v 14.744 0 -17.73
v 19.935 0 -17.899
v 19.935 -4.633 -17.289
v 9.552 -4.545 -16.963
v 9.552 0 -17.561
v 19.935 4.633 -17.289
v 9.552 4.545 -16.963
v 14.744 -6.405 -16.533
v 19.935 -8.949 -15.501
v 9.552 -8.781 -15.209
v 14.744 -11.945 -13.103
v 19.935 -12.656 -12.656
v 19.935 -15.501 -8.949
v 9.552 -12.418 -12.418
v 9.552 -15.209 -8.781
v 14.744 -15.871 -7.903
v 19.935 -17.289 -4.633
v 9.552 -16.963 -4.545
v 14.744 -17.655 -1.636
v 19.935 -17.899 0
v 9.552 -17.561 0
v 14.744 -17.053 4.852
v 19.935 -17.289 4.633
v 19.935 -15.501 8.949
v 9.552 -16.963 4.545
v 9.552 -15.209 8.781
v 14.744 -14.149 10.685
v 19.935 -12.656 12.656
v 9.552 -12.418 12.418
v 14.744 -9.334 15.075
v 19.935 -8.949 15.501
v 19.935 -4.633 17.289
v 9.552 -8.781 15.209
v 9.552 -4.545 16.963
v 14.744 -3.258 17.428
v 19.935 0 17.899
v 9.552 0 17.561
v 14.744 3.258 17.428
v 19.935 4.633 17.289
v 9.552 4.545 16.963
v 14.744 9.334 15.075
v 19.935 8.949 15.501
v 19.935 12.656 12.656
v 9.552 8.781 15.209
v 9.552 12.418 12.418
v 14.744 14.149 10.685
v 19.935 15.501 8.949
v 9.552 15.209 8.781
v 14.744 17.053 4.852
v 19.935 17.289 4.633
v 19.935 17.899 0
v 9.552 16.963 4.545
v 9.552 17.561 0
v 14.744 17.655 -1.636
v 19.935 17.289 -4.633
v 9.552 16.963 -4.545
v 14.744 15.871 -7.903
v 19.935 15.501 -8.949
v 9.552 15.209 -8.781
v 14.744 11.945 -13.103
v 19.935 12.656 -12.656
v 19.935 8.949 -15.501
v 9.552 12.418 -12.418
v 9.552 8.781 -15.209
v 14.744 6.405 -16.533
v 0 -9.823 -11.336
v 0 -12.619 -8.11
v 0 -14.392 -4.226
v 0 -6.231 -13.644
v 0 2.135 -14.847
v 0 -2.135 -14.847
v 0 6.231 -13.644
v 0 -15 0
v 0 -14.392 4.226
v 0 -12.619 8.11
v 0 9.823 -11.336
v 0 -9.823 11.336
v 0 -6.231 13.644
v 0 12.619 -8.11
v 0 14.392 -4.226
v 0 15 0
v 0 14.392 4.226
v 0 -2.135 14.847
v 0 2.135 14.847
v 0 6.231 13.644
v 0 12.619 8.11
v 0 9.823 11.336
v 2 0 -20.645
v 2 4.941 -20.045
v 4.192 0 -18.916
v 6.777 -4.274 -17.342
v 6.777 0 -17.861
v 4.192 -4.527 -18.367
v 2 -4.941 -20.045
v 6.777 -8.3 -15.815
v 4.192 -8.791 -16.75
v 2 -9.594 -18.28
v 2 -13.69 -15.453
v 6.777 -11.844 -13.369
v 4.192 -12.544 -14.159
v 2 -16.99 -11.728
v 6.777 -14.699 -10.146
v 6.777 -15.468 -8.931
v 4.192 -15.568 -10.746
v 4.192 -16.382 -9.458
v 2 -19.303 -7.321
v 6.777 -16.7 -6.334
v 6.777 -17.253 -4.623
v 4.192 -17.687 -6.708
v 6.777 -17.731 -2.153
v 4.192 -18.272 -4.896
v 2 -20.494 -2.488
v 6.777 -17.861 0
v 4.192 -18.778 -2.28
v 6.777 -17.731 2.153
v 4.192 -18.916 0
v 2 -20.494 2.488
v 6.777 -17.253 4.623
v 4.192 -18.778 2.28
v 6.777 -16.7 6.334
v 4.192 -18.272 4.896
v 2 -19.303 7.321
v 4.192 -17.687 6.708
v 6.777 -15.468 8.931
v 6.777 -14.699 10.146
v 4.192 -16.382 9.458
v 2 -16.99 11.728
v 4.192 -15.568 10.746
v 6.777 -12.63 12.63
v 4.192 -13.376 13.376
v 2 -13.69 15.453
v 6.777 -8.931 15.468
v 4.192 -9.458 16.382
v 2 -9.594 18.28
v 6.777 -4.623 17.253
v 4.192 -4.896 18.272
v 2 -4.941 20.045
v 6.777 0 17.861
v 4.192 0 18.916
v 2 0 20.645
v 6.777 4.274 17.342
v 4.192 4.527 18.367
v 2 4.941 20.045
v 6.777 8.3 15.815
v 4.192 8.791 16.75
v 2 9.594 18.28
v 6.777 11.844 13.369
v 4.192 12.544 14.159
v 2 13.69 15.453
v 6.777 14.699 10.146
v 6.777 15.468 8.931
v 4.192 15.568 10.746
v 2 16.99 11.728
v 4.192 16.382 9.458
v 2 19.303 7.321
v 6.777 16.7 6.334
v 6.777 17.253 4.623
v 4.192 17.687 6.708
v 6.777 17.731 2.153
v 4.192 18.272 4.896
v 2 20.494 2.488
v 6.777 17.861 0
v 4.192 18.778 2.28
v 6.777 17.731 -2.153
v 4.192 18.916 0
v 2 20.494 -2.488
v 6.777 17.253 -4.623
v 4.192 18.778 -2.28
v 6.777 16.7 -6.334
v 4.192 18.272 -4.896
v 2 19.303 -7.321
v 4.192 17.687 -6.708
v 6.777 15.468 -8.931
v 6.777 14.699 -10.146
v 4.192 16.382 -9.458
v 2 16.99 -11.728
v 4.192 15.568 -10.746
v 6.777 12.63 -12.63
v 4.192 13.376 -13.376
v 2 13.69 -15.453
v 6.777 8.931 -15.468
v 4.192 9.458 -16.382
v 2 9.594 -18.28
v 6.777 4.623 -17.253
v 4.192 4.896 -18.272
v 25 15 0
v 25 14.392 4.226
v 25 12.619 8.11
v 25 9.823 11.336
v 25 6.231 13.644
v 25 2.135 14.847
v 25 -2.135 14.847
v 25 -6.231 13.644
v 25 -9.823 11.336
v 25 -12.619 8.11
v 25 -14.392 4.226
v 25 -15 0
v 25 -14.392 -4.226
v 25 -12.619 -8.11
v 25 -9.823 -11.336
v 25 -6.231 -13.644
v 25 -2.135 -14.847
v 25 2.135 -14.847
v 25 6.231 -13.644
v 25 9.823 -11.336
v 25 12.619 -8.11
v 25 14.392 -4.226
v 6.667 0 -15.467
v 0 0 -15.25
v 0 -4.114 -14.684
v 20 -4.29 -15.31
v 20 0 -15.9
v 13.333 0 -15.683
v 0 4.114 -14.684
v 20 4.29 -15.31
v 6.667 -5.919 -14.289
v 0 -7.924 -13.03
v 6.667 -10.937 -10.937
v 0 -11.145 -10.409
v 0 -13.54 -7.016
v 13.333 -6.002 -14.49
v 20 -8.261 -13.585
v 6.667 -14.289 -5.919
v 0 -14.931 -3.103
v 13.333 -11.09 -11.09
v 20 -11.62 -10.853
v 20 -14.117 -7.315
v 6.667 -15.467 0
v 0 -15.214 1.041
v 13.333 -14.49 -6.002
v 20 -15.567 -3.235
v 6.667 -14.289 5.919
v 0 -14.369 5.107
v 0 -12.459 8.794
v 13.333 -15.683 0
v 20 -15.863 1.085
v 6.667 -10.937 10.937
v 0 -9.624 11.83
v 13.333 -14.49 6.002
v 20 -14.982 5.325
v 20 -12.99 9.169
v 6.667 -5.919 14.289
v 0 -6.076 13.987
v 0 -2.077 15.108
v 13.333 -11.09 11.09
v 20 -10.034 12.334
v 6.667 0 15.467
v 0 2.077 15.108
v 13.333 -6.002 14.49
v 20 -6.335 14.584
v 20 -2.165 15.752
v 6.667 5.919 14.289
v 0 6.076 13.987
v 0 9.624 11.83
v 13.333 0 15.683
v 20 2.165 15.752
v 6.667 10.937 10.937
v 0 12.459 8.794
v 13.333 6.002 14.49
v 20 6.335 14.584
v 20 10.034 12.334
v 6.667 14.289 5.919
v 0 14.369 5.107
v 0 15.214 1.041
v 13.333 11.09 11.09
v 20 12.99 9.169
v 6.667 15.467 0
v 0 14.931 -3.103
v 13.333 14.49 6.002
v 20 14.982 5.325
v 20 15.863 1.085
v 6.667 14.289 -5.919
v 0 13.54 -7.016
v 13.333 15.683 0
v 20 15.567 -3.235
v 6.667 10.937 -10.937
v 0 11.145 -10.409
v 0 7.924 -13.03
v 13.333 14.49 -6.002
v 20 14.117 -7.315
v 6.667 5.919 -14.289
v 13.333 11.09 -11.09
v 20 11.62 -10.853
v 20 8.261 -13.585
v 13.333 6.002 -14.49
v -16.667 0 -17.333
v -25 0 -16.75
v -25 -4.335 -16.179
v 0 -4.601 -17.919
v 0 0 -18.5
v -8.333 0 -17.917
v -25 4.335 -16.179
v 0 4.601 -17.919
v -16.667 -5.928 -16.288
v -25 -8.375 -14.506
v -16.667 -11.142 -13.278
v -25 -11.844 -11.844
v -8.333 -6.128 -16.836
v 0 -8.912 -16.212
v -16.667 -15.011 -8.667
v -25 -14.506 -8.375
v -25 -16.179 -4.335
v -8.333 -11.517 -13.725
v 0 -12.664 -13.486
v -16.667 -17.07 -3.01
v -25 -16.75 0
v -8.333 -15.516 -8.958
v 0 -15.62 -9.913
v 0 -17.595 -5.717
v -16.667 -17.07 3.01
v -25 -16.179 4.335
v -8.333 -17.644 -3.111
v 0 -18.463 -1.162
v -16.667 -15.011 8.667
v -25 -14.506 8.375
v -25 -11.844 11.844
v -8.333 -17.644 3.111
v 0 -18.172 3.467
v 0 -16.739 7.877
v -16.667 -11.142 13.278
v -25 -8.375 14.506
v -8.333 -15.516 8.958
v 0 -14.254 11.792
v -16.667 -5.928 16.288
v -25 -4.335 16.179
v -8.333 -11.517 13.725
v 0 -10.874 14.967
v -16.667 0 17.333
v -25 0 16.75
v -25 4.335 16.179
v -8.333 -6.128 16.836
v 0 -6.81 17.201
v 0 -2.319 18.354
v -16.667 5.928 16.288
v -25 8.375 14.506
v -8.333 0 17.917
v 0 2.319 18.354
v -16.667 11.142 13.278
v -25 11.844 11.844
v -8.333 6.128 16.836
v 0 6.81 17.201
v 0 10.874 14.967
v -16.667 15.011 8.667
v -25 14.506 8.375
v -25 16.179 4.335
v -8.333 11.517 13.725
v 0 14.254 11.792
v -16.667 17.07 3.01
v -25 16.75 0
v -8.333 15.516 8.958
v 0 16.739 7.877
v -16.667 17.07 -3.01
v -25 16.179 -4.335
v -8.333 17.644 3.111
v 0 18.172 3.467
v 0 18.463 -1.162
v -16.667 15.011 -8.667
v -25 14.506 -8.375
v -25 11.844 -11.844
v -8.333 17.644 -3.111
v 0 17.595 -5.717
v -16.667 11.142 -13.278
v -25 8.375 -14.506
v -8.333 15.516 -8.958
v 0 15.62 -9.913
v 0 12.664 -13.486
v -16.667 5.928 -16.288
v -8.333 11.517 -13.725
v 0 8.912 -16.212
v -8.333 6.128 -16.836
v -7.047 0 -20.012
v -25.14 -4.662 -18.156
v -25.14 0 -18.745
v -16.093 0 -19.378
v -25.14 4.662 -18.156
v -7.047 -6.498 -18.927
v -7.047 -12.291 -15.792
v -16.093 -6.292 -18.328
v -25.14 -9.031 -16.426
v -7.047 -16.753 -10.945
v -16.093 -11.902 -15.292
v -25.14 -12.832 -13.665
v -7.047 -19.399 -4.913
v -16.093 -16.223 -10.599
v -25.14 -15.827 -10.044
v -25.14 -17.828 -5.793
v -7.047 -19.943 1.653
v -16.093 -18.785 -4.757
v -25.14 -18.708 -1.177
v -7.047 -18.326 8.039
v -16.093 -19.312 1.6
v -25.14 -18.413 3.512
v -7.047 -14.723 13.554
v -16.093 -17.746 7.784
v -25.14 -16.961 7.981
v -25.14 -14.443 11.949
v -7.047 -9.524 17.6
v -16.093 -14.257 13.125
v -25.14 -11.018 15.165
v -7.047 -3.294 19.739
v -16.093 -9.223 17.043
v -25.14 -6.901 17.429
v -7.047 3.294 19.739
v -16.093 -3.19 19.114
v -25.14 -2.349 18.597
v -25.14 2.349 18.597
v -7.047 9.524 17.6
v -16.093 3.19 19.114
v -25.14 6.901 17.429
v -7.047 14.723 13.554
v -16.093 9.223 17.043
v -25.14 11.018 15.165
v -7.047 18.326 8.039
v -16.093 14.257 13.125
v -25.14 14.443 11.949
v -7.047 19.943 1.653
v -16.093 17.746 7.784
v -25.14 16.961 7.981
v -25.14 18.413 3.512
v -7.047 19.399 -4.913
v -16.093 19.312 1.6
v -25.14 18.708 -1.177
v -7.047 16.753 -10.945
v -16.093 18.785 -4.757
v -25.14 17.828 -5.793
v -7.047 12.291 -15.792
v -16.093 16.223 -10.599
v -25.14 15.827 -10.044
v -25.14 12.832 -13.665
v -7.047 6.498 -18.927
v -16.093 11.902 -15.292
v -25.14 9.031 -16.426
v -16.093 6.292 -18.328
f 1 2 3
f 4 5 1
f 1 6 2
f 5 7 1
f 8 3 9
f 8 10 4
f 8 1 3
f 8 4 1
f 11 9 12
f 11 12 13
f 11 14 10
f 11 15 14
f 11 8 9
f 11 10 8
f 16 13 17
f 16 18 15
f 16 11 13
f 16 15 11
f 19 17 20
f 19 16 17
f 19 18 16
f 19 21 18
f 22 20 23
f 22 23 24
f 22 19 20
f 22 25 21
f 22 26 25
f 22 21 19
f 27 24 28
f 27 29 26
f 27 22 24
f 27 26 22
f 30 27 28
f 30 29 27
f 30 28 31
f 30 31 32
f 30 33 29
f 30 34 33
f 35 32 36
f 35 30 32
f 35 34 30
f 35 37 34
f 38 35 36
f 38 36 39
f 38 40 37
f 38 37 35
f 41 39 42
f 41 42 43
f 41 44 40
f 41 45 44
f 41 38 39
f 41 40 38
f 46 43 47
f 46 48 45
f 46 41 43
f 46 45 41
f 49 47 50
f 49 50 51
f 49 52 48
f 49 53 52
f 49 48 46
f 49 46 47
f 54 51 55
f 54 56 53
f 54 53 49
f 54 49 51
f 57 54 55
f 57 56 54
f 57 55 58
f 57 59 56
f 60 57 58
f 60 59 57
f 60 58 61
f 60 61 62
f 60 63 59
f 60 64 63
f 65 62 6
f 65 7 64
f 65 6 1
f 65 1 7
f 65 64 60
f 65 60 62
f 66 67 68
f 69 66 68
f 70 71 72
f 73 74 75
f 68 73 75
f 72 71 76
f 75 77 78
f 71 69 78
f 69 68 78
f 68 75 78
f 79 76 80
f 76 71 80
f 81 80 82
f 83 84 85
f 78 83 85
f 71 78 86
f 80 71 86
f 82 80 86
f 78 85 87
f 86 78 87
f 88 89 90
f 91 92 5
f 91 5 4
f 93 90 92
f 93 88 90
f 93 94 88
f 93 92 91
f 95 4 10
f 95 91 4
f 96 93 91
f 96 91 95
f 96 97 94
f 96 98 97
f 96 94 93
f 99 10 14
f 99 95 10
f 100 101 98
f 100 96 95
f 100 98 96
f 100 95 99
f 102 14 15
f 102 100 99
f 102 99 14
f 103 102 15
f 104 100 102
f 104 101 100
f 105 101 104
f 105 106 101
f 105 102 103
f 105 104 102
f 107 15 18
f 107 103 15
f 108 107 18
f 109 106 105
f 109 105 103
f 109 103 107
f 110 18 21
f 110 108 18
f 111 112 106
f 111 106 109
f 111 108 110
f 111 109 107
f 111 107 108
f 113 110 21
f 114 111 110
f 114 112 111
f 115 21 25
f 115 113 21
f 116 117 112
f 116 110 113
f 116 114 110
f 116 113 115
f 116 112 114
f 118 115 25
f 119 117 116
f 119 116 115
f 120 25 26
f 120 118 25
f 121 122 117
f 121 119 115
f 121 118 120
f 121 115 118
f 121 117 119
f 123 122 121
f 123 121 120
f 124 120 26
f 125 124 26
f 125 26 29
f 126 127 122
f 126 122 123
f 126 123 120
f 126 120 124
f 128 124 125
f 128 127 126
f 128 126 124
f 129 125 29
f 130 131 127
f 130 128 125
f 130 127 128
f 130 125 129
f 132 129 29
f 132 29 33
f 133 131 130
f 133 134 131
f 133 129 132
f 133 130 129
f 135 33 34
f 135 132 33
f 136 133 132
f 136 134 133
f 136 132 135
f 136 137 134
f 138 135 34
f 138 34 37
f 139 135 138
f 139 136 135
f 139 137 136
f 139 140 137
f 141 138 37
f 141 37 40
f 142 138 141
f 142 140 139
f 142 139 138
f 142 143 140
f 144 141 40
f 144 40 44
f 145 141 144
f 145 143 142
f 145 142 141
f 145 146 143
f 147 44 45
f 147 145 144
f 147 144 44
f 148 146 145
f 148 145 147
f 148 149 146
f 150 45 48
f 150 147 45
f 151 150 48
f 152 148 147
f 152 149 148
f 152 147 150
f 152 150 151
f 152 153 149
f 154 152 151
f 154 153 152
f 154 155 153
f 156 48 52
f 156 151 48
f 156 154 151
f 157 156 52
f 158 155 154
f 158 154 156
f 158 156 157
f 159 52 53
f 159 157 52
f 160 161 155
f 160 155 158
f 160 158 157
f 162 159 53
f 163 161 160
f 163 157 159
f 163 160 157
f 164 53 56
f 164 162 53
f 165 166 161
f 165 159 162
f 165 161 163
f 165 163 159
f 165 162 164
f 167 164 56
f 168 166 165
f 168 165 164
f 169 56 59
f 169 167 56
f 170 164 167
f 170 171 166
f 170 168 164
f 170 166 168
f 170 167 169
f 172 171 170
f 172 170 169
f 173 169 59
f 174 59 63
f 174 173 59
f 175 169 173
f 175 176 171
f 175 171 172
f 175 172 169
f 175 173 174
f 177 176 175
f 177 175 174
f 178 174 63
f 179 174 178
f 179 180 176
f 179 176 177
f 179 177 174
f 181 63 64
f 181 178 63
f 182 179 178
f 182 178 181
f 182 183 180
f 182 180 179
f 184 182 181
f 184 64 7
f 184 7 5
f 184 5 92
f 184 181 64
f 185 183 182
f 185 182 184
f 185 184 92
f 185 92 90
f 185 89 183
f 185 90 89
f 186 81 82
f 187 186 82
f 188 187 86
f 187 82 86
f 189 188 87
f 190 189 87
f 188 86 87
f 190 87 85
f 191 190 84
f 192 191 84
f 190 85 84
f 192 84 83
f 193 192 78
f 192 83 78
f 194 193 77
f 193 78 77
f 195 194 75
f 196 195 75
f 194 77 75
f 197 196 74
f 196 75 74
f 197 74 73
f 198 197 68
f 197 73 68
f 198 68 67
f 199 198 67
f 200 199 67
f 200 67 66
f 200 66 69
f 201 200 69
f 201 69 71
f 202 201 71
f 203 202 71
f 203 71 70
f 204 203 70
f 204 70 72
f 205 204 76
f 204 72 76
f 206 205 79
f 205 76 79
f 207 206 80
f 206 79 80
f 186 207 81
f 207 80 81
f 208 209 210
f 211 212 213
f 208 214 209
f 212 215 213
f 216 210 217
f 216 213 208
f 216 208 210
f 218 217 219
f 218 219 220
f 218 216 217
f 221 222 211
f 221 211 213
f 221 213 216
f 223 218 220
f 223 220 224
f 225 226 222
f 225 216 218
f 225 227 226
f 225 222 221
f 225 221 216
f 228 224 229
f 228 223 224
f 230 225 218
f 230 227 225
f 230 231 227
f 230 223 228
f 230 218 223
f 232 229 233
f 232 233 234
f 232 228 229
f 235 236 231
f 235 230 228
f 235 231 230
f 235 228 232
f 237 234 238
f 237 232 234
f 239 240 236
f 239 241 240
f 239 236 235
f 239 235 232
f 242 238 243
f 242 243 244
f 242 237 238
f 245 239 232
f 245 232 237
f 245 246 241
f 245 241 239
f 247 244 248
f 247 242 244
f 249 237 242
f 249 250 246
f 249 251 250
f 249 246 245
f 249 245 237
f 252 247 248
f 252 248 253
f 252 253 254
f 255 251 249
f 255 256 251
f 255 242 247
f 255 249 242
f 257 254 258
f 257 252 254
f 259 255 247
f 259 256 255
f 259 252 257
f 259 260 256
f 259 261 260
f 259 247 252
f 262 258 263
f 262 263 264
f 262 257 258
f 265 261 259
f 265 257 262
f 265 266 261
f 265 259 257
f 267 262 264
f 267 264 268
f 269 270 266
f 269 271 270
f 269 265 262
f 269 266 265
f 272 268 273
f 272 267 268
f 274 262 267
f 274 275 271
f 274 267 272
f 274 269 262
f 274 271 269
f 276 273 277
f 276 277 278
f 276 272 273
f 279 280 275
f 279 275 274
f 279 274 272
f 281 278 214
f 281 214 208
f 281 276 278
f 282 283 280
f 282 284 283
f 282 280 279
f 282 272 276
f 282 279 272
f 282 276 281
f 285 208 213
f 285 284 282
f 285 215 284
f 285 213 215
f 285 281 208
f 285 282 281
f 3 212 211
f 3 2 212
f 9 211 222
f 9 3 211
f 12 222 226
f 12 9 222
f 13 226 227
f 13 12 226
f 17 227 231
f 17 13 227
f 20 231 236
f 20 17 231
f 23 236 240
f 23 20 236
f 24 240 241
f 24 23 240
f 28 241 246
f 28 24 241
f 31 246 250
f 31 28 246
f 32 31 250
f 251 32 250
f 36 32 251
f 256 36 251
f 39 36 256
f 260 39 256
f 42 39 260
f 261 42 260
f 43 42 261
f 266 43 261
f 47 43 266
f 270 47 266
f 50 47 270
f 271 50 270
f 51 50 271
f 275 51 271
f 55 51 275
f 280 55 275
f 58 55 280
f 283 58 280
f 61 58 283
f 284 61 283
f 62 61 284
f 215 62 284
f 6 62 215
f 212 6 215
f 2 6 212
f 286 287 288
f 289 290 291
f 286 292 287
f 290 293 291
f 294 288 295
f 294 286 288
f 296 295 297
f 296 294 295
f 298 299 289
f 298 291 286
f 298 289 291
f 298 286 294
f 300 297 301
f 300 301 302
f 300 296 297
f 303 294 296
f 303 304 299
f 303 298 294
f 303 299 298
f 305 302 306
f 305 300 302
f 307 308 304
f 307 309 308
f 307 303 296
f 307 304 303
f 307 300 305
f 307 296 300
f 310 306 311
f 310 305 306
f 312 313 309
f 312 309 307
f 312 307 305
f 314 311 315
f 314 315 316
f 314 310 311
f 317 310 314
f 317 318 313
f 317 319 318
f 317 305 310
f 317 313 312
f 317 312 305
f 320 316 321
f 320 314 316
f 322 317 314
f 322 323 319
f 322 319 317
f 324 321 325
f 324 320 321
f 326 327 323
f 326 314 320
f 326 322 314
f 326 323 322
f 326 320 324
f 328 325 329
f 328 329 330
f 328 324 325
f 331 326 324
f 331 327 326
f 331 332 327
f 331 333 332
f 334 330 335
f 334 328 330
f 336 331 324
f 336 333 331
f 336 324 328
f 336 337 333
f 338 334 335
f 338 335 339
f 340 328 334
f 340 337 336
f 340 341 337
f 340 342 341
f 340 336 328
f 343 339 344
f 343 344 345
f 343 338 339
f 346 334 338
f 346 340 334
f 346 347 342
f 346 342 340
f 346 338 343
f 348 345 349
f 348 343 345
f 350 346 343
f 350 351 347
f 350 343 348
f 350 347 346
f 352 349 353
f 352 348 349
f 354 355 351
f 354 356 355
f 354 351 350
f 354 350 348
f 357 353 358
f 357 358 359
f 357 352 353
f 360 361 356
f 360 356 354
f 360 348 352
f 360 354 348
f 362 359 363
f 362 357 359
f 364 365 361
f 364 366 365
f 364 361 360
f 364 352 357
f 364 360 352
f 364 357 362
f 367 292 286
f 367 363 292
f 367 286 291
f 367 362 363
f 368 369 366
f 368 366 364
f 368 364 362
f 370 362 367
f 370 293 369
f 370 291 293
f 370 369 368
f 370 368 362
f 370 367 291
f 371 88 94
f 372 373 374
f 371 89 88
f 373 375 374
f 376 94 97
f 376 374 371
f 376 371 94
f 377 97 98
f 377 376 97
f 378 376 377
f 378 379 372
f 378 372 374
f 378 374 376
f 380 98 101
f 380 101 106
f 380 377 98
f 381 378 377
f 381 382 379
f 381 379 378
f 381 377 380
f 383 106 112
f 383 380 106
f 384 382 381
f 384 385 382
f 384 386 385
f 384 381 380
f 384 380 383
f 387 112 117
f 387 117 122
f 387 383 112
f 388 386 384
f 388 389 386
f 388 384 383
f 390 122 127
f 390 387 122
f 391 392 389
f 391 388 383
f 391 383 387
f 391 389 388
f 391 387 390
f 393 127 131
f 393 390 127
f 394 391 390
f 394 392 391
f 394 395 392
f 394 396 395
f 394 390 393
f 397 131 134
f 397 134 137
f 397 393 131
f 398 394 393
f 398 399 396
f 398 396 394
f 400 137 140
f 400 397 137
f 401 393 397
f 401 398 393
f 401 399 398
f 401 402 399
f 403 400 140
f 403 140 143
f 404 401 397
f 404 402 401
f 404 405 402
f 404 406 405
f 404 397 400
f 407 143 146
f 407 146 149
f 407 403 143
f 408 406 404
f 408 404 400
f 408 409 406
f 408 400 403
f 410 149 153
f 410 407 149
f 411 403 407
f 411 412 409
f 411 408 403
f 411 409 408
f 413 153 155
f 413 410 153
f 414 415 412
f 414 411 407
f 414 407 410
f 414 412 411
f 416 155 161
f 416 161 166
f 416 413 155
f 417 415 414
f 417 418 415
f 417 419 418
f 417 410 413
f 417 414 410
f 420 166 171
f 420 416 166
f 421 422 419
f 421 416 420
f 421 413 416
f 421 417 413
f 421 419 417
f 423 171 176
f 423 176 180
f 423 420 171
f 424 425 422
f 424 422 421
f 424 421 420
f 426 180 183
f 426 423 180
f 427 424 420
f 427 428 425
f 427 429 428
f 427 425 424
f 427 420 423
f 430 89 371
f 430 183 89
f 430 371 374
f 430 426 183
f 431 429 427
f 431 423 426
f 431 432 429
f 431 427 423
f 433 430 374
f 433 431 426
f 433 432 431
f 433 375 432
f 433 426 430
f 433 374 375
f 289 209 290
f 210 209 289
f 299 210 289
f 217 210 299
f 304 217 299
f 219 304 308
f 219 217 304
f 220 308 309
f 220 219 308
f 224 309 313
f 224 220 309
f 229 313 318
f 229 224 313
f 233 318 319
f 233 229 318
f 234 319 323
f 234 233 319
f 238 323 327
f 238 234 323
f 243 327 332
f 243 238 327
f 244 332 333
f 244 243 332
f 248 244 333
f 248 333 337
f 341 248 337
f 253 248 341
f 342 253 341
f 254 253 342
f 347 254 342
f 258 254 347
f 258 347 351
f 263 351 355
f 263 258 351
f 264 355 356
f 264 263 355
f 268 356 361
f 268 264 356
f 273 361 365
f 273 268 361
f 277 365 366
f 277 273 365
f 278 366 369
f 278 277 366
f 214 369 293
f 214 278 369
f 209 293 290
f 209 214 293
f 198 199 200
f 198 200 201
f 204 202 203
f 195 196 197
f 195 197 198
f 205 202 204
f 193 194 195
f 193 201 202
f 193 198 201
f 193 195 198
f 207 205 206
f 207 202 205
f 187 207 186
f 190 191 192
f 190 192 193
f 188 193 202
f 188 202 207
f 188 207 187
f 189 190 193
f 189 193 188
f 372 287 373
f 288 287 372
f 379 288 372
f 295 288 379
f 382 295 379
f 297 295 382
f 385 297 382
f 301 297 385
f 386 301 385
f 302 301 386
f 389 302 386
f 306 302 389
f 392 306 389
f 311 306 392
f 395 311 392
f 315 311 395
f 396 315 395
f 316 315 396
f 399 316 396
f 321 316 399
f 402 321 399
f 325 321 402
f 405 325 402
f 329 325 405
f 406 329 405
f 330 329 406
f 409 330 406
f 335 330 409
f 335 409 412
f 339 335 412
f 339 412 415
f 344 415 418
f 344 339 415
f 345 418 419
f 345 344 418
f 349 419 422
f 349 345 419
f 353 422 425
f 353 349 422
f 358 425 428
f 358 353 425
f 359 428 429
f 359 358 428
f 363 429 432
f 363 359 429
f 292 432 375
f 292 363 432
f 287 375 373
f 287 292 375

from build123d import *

# Parameters (mm, degrees)
F1_R     = 15
F2_DEPTH = 25


# Not quite as in the source:
# - a fillet or chamfer that OpenCascade refuses, or shapes differently, is made with other operations: its cross-section is extruded or revolved along the edge and cut away or added


with BuildPart() as f2:
    # F1 (on Right) → F2 (new body)
    with BuildSketch(Plane.YZ):
        Circle(F1_R)
    extrude(amount=F2_DEPTH)


with BuildPart() as f3:
    # F3: sweep along a path in F3_path
    with BuildLine(Plane(origin=(0, 15, 0), x_dir=(0, 0, -1), z_dir=(-1, 0, 0))) as f3_path:
        CenterArc((0, 15), 15, 0, 360)
    # F0 (on Front) → F3 (sweep)
    with BuildSketch(Plane.XZ):
        Polygon((0, 18.5), (0, 15.25), (20, 15.9), (19.935034301, 17.898944586), (2, 17.3160559712), (2, 20.6448940122), (-25.1396582554, 18.7451179343), (-25, 16.75), align=None)
    sweep(path=f3_path.line)

    # F4: fillet of radius 10 on 1 edges, made by hand

    # F4_s1 → F4_t2 (revolve)
    with BuildSketch(Plane.XZ):
        with BuildLine():
            ThreePointArc((9.5521060353, -17.5614994174), (5.4473593848, -18.2981329798), (2, -20.6448940122))
            Line((2, -20.6448940122), (1.8554544492, -20.5066674455))
            ThreePointArc((1.8554544492, -20.5066674455), (1.8, -18.9804749917), (1.8, -17.3160559712))
            Line((1.8, -17.3160559712), (2.0064965699, -17.1161615126))
            Line((2.0064965699, -17.1161615126), (9.5586026053, -17.3616049588))
            Line((9.5586026053, -17.3616049588), (9.5521060353, -17.5614994174))
        make_face()
    revolve(axis=Axis((2, 0, 0), (-1, 0, 0)))


solid = Compound([f2.part, f3.part])
